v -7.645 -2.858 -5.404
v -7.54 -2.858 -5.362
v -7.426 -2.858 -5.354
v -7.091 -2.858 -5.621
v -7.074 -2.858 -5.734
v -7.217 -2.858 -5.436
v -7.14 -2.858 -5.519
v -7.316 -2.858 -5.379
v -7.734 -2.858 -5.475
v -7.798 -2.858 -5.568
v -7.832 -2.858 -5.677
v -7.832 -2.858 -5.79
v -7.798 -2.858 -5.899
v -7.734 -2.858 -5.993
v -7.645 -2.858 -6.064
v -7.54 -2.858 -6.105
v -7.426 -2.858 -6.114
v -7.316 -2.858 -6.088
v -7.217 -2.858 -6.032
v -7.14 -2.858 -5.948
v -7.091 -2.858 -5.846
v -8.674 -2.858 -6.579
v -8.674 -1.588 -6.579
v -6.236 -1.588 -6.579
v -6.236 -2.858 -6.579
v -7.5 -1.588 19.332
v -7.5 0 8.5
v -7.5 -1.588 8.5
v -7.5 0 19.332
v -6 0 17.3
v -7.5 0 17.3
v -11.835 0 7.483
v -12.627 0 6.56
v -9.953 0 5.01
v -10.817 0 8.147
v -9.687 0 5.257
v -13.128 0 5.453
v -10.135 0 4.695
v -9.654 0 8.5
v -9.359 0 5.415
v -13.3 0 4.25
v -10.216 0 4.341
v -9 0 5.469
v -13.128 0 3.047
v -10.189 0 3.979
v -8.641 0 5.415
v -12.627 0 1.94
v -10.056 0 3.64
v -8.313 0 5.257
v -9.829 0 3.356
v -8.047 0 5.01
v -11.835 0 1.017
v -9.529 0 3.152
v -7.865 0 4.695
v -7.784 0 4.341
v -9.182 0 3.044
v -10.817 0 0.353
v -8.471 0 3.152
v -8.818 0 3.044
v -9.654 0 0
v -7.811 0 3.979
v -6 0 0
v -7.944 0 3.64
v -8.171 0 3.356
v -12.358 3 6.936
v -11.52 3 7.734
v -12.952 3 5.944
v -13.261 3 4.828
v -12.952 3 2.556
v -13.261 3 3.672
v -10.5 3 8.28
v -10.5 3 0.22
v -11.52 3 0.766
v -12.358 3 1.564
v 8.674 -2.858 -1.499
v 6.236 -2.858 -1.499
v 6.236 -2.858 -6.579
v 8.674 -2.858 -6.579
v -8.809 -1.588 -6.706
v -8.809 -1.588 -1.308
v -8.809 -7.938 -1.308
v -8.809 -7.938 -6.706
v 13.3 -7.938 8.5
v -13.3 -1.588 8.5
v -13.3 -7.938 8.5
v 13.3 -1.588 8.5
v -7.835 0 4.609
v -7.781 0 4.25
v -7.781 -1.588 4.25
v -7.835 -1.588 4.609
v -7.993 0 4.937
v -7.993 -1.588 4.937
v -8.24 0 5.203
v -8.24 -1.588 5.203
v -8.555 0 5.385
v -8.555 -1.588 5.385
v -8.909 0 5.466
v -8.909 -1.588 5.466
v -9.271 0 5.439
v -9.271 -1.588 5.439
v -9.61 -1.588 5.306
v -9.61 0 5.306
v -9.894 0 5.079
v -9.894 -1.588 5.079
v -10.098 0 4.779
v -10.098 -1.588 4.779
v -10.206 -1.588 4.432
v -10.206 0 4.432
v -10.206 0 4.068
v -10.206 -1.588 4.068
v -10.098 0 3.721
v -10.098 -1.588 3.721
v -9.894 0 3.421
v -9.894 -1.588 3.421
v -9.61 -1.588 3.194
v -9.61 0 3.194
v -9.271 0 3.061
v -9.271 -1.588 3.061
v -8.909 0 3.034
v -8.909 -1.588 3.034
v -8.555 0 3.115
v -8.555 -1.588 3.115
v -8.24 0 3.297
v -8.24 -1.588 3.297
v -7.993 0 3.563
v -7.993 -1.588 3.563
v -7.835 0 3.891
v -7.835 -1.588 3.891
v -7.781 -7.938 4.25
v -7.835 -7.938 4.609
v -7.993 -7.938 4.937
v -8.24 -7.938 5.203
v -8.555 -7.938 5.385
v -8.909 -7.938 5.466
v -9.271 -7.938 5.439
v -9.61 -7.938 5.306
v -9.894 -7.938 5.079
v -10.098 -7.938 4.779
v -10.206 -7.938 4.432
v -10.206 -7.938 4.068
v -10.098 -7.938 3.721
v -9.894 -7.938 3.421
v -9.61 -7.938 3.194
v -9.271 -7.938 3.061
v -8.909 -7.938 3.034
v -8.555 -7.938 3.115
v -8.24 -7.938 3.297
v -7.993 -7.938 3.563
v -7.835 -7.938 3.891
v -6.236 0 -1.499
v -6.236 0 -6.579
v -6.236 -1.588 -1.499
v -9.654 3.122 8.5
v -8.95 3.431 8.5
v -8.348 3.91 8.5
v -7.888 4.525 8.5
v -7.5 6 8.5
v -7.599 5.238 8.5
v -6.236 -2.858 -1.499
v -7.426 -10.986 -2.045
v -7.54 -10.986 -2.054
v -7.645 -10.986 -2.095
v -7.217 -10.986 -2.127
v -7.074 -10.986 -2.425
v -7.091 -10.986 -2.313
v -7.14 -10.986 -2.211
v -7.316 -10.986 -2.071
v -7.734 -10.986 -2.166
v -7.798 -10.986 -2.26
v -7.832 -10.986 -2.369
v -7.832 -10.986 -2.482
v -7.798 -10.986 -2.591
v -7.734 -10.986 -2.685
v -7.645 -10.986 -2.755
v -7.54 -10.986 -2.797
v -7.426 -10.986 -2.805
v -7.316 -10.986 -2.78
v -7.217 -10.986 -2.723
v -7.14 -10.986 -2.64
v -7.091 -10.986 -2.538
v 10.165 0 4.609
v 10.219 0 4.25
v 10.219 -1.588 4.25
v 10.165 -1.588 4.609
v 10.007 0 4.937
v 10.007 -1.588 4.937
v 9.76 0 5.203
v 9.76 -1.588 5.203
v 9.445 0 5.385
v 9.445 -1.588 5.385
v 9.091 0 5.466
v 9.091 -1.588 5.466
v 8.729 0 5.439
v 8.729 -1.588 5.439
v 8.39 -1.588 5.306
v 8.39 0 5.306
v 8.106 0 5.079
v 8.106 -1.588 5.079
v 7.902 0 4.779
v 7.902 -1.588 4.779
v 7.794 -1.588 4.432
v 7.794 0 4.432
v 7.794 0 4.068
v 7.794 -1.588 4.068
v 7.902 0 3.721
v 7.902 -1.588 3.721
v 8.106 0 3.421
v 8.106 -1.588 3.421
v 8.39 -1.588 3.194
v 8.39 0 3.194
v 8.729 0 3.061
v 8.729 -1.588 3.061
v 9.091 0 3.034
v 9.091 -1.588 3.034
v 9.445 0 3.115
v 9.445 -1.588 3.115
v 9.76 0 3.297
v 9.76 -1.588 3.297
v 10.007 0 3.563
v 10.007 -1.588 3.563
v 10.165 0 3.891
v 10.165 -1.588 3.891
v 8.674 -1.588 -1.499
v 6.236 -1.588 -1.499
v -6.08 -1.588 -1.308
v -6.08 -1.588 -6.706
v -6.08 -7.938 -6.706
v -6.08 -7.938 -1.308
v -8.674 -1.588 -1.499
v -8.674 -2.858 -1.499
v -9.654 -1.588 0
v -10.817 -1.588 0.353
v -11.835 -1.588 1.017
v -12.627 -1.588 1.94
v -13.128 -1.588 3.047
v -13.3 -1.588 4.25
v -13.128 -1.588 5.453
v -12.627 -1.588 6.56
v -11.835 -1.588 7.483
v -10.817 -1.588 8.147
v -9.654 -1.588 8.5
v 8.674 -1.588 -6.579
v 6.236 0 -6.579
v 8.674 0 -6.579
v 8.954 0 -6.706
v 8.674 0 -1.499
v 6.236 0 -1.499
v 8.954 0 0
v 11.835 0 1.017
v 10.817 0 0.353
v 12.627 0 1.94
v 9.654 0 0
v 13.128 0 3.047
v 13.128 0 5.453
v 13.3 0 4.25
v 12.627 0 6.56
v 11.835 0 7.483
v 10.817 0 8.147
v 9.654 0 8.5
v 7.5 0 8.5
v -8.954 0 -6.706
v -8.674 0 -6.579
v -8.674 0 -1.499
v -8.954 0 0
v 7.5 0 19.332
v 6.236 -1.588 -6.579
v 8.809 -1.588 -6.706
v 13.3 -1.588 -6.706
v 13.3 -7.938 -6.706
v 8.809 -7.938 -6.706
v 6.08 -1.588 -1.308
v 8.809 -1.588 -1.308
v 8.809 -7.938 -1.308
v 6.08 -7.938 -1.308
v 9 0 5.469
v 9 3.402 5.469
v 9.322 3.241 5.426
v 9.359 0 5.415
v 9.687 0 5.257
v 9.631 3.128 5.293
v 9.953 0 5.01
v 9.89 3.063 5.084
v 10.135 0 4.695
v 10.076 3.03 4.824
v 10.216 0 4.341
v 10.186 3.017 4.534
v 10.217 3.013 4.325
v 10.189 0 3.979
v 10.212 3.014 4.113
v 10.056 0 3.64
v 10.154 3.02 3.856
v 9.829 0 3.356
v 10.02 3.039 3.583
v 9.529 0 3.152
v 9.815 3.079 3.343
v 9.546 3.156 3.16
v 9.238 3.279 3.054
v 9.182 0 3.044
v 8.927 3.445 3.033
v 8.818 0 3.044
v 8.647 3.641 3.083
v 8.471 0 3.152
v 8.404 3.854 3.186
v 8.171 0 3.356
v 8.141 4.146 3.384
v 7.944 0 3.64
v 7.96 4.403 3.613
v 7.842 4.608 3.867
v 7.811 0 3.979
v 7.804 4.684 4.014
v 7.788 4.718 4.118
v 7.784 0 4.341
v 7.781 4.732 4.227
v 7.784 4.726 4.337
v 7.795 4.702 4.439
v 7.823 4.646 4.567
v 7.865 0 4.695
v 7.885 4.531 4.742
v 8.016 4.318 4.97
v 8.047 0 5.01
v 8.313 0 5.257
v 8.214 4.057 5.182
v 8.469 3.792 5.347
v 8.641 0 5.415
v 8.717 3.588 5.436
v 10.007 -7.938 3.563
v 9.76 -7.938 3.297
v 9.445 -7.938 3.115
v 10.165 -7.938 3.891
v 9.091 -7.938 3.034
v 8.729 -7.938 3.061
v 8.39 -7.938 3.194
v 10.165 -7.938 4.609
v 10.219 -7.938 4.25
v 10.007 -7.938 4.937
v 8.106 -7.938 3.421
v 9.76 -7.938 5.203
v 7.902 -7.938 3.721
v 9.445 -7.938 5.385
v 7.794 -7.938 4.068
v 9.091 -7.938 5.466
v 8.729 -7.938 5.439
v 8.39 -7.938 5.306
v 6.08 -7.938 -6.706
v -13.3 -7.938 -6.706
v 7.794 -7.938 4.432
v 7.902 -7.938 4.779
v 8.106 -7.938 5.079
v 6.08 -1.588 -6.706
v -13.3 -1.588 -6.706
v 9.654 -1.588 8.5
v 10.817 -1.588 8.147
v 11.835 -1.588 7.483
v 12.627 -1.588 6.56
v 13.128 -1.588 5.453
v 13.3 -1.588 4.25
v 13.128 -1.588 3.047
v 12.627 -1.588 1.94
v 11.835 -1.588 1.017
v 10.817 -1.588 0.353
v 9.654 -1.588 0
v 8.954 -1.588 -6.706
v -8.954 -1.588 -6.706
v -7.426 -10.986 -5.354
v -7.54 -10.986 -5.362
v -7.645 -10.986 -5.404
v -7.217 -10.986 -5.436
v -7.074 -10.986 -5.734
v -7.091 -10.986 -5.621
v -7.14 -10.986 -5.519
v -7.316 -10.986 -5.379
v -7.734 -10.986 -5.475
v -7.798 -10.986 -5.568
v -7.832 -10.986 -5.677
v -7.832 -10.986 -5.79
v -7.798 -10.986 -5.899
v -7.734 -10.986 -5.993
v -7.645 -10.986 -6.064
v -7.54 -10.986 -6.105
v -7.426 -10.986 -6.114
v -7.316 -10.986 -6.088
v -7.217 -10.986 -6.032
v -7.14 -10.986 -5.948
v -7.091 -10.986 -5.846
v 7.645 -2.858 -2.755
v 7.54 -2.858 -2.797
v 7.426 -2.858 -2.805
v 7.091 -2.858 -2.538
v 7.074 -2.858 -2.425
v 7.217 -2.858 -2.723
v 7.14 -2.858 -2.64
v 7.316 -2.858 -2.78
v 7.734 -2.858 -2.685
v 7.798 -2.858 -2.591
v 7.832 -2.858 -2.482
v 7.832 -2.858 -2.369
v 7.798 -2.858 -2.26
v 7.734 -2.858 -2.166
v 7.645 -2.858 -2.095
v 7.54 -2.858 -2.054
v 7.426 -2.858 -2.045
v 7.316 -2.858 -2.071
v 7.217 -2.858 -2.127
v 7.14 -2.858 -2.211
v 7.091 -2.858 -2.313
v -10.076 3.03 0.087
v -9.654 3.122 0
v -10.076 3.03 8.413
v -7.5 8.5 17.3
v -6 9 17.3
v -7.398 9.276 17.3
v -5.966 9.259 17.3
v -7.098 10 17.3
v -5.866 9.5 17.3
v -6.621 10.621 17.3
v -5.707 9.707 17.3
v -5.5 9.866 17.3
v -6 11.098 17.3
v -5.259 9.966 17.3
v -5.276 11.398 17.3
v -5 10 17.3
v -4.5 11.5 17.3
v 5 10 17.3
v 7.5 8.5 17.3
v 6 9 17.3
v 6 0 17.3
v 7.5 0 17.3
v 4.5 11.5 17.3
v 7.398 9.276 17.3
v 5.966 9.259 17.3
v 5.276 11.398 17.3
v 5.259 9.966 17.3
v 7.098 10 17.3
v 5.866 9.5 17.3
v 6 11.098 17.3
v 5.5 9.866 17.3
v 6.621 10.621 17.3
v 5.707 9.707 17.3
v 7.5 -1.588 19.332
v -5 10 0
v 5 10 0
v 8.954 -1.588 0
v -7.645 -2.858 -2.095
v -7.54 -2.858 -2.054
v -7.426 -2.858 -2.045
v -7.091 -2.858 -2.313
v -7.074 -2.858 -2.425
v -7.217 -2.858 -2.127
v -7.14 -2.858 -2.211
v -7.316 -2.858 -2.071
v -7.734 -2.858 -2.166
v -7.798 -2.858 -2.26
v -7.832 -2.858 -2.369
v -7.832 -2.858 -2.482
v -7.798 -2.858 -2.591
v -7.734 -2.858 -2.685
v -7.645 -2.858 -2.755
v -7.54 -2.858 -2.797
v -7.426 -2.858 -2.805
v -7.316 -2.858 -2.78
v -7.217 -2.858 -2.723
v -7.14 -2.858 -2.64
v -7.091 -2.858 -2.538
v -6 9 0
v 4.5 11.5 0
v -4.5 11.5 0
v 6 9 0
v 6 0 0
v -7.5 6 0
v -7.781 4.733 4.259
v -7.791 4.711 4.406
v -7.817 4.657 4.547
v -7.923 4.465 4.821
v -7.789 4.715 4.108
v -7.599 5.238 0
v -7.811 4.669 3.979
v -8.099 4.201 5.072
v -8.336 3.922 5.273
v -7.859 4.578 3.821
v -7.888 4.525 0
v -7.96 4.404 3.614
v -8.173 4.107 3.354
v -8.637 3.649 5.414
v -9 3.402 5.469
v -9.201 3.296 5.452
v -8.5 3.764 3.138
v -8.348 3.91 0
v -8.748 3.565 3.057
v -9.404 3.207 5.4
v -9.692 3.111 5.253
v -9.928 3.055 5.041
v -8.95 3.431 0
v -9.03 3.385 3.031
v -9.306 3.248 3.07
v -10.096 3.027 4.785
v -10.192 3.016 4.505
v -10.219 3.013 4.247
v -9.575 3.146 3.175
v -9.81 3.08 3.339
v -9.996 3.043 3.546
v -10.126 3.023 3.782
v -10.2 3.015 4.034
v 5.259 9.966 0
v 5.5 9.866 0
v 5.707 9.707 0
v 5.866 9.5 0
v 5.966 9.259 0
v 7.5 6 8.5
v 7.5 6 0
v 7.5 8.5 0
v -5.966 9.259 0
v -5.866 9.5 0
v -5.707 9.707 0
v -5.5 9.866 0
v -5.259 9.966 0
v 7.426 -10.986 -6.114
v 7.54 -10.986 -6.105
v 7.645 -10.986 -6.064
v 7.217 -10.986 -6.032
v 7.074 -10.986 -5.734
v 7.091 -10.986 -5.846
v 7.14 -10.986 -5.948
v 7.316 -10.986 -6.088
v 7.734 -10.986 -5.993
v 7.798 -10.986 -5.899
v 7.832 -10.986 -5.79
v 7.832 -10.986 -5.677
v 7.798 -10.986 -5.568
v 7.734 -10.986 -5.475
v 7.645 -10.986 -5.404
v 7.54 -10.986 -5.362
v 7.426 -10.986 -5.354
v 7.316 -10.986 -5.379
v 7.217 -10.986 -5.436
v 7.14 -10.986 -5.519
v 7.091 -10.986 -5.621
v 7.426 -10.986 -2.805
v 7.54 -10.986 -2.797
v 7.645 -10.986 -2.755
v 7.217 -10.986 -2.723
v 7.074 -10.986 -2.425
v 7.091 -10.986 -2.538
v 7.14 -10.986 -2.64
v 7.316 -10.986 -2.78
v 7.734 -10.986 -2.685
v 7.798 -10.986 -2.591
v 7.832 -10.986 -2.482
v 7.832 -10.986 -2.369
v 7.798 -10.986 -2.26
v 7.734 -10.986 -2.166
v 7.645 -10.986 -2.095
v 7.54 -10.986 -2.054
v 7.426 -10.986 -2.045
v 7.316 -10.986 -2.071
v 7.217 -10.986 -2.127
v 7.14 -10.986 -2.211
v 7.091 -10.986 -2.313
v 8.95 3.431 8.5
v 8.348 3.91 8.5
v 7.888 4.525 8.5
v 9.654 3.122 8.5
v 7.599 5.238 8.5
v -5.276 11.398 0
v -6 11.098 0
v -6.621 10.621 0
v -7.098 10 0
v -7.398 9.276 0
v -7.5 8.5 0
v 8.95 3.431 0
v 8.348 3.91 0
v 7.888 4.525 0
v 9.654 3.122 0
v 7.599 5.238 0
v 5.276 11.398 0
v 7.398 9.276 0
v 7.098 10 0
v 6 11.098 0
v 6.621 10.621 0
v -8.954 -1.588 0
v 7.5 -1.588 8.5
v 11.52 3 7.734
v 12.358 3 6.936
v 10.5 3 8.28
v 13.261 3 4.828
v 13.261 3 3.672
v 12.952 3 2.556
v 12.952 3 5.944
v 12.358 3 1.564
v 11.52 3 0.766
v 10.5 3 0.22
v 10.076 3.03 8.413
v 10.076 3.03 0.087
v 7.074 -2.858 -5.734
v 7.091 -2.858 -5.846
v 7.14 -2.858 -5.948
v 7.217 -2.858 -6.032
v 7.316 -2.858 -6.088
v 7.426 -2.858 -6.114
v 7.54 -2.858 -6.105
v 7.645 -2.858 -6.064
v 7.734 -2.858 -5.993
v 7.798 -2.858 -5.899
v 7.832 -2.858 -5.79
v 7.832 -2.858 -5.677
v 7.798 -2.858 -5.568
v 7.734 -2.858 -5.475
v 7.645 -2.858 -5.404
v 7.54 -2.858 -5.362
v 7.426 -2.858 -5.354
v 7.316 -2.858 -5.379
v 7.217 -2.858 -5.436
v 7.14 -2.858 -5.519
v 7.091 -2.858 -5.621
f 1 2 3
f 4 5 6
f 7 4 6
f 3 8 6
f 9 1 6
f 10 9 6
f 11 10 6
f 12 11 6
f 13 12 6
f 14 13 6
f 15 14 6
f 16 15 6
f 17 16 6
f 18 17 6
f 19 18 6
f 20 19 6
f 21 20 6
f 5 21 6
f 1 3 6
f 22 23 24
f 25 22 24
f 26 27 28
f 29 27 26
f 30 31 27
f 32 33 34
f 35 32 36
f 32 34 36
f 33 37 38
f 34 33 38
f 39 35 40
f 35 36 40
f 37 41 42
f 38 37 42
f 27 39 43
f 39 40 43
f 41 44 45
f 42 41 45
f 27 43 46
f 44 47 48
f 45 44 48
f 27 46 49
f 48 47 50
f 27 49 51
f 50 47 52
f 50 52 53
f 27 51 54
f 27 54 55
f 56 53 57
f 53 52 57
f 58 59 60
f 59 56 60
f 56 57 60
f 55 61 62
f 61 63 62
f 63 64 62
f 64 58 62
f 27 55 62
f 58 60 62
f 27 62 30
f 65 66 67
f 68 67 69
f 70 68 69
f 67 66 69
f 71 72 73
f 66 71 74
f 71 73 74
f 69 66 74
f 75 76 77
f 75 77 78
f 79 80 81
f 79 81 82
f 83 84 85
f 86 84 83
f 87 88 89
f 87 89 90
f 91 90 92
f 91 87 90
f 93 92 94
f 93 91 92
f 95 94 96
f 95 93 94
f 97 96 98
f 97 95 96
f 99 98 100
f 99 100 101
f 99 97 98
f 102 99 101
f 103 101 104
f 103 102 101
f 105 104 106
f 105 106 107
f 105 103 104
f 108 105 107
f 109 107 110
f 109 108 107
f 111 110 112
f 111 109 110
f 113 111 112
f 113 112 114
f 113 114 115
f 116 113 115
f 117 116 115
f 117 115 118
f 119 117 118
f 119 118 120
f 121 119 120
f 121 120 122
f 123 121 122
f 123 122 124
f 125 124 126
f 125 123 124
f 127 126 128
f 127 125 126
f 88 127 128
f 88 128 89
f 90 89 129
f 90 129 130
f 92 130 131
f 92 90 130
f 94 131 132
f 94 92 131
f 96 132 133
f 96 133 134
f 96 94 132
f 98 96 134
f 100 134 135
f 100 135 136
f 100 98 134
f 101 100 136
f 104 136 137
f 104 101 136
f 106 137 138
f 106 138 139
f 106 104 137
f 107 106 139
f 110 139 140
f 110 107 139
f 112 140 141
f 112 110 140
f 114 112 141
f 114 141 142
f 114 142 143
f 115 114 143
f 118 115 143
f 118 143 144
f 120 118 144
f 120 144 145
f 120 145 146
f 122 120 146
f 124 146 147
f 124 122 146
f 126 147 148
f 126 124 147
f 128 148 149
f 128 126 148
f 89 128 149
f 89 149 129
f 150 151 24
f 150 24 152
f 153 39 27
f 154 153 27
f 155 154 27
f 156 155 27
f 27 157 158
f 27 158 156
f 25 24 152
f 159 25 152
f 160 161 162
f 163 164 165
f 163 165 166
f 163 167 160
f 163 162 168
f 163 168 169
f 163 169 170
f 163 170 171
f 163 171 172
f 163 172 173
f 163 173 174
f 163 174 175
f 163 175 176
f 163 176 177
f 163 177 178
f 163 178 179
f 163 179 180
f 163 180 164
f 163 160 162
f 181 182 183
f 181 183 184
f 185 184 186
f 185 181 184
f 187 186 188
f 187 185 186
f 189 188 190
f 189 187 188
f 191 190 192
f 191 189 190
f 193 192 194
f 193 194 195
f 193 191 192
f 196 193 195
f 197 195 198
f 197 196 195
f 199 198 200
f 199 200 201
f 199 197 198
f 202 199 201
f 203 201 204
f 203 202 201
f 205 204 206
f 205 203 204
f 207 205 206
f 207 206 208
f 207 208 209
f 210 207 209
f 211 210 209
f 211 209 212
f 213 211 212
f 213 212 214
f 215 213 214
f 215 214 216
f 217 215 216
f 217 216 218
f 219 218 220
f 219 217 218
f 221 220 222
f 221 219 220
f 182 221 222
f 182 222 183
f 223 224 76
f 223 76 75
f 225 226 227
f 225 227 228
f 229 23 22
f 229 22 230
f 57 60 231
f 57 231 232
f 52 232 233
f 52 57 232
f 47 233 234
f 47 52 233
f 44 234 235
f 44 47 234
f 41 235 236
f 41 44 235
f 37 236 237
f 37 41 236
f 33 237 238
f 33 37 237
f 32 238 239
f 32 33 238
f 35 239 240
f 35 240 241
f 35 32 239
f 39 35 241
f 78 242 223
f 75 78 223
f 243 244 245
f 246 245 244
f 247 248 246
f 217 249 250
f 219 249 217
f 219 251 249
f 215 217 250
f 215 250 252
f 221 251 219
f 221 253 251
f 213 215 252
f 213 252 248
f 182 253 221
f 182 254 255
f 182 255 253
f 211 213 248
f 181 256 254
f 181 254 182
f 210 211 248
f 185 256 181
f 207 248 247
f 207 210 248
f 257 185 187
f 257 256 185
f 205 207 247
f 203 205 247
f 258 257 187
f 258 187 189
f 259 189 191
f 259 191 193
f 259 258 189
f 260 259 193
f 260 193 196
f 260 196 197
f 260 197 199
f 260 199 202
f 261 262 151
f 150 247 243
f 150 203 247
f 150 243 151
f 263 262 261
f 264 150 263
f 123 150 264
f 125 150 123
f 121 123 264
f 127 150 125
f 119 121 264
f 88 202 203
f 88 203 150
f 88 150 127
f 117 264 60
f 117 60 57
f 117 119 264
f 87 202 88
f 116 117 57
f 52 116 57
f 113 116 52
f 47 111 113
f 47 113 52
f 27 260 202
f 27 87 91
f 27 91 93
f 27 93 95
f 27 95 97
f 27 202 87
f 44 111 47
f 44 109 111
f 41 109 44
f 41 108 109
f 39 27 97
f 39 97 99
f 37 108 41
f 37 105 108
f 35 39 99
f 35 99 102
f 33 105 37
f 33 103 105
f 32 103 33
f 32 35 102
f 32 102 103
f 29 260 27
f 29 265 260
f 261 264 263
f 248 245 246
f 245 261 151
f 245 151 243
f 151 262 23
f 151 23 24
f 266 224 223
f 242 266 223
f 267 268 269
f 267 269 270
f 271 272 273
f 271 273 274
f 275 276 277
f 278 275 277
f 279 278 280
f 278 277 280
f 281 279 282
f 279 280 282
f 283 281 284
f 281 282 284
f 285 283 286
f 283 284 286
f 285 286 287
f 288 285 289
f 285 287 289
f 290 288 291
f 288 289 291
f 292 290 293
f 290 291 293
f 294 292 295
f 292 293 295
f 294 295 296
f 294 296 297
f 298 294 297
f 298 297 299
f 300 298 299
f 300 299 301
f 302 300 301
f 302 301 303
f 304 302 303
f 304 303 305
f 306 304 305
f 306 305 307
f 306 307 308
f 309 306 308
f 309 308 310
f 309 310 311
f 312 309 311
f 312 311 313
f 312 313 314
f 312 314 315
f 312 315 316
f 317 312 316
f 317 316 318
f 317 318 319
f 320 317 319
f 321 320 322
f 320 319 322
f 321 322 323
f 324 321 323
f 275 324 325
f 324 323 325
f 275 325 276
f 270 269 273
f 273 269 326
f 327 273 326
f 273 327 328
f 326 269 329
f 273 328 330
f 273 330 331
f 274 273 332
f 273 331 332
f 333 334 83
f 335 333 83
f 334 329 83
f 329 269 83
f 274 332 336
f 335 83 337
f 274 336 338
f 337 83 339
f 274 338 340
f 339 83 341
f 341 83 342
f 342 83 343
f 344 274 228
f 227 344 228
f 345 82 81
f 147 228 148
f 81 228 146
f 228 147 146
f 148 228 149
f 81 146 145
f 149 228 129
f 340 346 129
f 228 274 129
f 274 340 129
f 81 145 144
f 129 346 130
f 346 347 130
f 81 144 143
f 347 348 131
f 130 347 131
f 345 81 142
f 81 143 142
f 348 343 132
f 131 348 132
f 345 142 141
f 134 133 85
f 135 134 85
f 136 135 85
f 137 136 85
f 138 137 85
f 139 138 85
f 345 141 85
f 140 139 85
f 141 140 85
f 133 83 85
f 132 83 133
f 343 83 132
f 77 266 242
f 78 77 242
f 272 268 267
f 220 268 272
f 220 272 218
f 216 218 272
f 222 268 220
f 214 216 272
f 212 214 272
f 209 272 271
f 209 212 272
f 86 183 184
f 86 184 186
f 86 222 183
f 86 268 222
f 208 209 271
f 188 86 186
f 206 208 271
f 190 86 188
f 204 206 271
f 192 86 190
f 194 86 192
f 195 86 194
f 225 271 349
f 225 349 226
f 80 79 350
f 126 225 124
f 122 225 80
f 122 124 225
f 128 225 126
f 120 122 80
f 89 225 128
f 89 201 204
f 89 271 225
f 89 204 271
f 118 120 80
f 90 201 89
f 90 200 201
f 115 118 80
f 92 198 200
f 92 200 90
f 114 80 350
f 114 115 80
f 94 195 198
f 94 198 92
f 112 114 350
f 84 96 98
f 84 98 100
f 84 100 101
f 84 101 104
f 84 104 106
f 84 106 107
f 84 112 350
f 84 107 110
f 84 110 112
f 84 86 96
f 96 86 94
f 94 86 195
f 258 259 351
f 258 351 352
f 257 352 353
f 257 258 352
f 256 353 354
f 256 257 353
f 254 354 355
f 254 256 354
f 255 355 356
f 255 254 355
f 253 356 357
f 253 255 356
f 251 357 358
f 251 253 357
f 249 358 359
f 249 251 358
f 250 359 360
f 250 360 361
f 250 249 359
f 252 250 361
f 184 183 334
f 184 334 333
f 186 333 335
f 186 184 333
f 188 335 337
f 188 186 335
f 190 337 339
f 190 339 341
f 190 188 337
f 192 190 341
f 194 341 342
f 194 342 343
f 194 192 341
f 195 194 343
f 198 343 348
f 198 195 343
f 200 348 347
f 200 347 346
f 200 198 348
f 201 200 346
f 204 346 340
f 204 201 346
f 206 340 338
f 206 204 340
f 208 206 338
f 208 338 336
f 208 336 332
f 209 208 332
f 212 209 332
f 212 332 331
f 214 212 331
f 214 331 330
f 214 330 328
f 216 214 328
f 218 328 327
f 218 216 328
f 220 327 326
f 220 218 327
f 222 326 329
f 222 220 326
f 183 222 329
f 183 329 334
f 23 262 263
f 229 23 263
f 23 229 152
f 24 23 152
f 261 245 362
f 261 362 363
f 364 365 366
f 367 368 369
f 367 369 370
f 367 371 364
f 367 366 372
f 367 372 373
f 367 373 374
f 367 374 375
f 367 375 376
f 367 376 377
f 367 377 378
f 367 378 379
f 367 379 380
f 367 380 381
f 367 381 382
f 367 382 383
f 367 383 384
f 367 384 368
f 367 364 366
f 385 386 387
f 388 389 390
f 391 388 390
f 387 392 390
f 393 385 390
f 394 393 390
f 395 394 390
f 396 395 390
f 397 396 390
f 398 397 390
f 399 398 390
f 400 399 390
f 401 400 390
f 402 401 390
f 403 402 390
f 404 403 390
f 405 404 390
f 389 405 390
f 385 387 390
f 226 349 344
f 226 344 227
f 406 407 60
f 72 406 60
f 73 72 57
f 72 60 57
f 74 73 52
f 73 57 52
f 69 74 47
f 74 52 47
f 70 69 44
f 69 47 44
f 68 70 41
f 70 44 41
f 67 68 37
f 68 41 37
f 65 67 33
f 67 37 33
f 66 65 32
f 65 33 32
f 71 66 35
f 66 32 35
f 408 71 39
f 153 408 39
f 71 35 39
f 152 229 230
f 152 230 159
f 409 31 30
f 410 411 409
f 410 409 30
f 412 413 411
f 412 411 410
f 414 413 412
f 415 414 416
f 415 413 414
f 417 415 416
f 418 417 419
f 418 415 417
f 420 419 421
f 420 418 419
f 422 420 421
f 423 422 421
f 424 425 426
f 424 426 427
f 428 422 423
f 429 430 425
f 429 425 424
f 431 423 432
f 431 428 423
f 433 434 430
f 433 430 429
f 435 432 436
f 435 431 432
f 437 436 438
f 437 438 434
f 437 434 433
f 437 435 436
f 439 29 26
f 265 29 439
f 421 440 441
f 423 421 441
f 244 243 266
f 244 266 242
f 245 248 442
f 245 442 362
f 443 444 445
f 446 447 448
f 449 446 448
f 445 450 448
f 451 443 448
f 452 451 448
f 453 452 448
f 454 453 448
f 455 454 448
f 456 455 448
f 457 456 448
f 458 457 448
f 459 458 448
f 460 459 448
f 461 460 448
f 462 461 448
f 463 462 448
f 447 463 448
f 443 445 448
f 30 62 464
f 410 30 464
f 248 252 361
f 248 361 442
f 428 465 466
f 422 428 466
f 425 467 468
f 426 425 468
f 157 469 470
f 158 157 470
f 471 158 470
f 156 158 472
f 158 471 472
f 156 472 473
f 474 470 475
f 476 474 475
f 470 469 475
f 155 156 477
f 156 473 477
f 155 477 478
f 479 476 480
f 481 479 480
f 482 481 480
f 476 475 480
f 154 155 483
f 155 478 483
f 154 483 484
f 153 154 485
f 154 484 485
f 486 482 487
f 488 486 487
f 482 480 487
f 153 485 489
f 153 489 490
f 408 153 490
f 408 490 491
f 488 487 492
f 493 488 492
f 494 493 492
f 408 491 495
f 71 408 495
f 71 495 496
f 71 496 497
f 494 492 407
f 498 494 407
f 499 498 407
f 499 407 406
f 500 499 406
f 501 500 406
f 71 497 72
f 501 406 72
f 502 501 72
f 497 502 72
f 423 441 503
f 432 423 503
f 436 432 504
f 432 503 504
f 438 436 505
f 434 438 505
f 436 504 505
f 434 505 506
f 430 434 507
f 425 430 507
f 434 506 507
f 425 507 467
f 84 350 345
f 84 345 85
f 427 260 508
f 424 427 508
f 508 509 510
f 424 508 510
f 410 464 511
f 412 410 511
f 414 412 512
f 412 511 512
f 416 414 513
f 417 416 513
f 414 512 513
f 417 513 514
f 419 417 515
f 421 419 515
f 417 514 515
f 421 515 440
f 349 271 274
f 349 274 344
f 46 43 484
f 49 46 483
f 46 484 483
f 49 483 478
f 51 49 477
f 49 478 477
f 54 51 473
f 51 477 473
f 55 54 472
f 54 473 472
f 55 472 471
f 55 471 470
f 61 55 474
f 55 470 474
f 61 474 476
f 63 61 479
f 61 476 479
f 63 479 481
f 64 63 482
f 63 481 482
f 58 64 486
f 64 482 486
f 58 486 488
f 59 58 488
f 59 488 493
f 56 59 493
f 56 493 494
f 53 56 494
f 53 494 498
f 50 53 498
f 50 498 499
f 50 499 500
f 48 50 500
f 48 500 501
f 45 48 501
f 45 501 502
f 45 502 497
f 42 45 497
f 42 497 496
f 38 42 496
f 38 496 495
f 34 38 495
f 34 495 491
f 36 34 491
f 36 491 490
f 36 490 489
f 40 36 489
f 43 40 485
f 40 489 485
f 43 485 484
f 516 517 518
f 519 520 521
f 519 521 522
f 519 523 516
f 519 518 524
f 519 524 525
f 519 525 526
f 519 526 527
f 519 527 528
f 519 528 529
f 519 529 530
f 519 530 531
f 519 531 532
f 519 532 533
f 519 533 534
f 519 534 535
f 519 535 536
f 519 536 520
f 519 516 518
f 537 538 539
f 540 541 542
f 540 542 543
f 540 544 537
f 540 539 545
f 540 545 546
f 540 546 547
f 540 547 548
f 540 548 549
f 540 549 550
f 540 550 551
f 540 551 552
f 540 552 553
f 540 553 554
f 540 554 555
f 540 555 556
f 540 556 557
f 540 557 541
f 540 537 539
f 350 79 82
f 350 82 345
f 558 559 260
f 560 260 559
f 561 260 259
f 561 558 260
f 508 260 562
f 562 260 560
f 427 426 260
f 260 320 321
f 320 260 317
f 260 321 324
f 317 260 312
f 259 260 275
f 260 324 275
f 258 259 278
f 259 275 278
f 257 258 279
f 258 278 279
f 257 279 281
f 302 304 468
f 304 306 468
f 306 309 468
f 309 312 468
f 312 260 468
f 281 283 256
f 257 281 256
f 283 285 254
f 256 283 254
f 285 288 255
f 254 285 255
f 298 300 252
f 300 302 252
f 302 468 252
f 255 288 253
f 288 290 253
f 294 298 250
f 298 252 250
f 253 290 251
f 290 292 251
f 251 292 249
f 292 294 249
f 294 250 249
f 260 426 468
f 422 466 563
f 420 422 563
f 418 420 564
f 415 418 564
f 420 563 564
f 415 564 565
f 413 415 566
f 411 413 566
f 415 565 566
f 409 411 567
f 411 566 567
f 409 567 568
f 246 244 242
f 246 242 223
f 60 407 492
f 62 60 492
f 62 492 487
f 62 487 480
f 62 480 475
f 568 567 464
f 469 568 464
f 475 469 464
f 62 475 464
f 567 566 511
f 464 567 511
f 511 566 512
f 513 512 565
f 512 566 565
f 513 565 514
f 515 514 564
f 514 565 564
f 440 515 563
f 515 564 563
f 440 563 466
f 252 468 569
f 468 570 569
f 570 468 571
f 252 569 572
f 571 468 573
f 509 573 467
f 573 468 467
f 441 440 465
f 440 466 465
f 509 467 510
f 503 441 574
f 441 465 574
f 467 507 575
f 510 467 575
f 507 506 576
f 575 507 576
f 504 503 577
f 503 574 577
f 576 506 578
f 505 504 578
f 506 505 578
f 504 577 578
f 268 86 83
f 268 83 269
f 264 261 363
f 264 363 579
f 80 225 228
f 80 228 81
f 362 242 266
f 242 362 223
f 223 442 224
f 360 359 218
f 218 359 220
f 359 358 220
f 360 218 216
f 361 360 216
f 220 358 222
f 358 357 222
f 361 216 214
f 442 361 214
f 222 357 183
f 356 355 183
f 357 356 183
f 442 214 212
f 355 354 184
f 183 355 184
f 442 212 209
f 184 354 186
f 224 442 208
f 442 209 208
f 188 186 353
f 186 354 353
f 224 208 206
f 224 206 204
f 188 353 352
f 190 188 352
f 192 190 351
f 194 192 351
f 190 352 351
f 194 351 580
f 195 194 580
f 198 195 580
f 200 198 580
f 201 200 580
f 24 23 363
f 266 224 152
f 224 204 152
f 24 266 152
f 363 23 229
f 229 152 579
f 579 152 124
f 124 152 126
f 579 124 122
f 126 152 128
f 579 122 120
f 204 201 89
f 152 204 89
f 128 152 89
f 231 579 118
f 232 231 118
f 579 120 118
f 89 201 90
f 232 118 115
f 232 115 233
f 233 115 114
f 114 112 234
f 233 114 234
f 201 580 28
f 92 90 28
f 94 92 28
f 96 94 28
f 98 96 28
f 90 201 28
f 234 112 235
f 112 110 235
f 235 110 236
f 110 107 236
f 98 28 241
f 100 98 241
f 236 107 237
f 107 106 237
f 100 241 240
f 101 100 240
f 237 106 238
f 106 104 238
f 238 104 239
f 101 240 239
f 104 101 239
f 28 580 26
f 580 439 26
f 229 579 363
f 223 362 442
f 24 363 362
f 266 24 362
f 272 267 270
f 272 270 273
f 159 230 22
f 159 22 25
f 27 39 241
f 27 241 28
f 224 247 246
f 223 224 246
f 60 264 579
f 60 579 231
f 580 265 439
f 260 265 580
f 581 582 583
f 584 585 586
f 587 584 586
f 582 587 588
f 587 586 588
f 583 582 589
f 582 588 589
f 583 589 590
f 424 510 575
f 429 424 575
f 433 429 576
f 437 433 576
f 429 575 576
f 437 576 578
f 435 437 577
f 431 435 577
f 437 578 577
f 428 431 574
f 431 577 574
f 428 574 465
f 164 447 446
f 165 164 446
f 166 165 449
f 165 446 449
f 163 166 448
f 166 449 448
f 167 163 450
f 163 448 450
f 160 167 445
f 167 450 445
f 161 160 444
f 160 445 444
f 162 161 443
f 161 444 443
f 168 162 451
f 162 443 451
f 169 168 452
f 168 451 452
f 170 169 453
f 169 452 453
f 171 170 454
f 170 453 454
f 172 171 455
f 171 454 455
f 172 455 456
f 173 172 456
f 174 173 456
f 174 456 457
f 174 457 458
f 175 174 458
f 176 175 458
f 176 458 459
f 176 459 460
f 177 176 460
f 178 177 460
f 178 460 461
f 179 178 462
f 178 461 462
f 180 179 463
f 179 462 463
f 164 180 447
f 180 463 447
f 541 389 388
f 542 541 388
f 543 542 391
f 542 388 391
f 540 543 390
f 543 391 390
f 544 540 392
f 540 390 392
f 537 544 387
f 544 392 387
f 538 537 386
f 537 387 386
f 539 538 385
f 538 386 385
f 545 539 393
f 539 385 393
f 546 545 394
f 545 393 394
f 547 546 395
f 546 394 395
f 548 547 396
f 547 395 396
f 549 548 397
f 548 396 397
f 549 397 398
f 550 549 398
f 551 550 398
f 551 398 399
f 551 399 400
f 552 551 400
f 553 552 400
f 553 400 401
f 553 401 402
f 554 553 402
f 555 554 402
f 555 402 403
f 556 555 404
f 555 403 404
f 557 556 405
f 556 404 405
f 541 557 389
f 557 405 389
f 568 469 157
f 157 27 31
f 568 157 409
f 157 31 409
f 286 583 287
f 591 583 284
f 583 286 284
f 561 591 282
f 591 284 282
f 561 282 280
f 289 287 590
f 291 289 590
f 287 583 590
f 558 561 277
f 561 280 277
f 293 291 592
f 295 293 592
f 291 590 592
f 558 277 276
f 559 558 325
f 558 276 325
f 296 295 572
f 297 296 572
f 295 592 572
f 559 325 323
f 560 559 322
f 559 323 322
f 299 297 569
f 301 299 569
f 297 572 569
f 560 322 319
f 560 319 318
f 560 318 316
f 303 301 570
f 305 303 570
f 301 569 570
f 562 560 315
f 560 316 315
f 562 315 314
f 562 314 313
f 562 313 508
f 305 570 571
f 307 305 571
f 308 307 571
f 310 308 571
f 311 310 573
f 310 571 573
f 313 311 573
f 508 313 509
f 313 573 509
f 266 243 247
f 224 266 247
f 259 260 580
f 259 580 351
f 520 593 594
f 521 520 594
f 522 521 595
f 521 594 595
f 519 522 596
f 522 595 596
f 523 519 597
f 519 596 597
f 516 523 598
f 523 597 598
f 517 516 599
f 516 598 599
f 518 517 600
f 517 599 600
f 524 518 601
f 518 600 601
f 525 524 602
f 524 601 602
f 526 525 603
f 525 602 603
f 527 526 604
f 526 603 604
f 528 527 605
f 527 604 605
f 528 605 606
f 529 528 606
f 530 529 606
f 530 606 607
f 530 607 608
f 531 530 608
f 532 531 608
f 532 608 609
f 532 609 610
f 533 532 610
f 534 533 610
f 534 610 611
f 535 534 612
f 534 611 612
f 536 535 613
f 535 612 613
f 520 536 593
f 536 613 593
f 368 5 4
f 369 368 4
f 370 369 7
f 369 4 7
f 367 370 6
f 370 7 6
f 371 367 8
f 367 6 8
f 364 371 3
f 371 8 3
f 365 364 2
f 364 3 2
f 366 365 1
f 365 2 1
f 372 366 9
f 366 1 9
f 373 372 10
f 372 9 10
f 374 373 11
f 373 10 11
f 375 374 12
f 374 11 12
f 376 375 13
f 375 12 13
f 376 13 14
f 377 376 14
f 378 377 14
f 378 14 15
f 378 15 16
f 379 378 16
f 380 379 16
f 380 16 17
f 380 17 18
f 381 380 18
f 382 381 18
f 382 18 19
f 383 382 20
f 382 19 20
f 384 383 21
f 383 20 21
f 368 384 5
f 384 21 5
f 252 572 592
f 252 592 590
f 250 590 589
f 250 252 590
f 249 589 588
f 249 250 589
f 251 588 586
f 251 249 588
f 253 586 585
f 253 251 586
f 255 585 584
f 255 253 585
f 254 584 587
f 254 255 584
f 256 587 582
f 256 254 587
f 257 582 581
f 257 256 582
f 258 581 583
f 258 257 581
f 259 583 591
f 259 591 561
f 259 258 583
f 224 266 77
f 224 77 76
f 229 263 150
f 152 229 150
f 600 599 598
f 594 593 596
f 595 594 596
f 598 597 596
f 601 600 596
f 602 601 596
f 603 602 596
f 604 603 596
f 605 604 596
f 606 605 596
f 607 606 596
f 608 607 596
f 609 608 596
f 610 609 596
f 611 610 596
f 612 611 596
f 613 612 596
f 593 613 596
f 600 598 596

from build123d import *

# Parameters (mm, degrees)
EXTRUDE1_DEPTH            = 17.3
SKETCH2_W                 = 5.8
SKETCH2_H                 = 8.5
EXTRUDE2_DEPTH            = 8.8
SKETCH3_R                 = 1
EXTRUDE3_DEPTH            = 5
F_2_CLEARANCE_HOLE1_D     = 2.4384
F_2_CLEARANCE_HOLE1_DEPTH = 11.5
SKETCH5_R                 = 1.2192
SKETCH5_W                 = 2.4384
SKETCH5_H                 = 5.08
EXTRUDE4_DEPTH            = 1.5875
SKETCH6_W                 = 2.4384
SKETCH6_H                 = 5.08
EXTRUDE5_DEPTH            = 1.27
EXTRUDE5_2_DEPTH          = 1.27
SKETCH7_R                 = 0.381
EXTRUDE6_DEPTH            = 8.128
EXTRUDE6_2_DEPTH          = 8.128
EXTRUDE6_3_DEPTH          = 8.128
EXTRUDE6_4_DEPTH          = 8.128
SKETCH8_R                 = 1.2192
EXTRUDE7_DEPTH            = 6.35


with BuildPart() as part:
    # Sketch1 → Extrude1 (new body)
    with BuildSketch(Plane.XY):
        with BuildLine():
            Line((-13.3, 0), (-6, 0))
            Line((-6, 0), (-6, 9))
            ThreePointArc((-6, 9), (-5.707106781, 9.707106781), (-5, 10))
            Line((-5, 10), (5, 10))
            ThreePointArc((5, 10), (5.707106781, 9.707106781), (6, 9))
            Line((6, 9), (6, 0))
            Line((6, 0), (13.3, 0))
            Line((13.3, 0), (13.3, 3))
            Line((13.3, 3), (10.5, 3))
            ThreePointArc((10.5, 3), (8.378679656, 3.878679656), (7.5, 6))
            Line((7.5, 6), (7.5, 8.5))
            ThreePointArc((7.5, 8.5), (6.621320344, 10.621320344), (4.5, 11.5))
            Line((4.5, 11.5), (-4.5, 11.5))
            ThreePointArc((-4.5, 11.5), (-6.621320344, 10.621320344), (-7.5, 8.5))
            Line((-7.5, 8.5), (-7.5, 6))
            ThreePointArc((-7.5, 6), (-8.378679656, 3.878679656), (-10.5, 3))
            Line((-10.5, 3), (-13.3, 3))
            Line((-13.3, 3), (-13.3, 0))
        make_face()
    extrude(amount=EXTRUDE1_DEPTH)

    # Sketch2 → Extrude2 (cut)
    with BuildSketch(Plane.XY.offset(17.3)):
        with Locations((-10.4, 4.25)):
            Rectangle(SKETCH2_W, SKETCH2_H)
        with Locations((10.4, 4.25)):
            Rectangle(SKETCH2_W, SKETCH2_H)
    extrude(amount=-EXTRUDE2_DEPTH, mode=Mode.SUBTRACT)

    # Sketch3 → Extrude3 (cut)
    with BuildSketch(Plane.XZ):
        with Locations(Location((-9, 4.25, 0), (0, 0, 270))):  # turned: the seam where the file's is
            Circle(SKETCH3_R)
        with Locations(Location((9, 4.25, 0), (0, 0, 270))):  # turned: the seam where the file's is
            Circle(SKETCH3_R)
        with BuildLine():
            Line((9.653834842, 8.5), (9.653834842, 9.262963398))
            Line((9.653834842, 9.262963398), (15.079268599, 9.262963398))
            Line((15.079268599, 9.262963398), (15.079268599, -0.486230121))
            Line((15.079268599, -0.486230121), (9.653834842, -0.486230121))
            Line((9.653834842, -0.486230121), (9.653834842, 0))
            ThreePointArc((9.653834842, 0), (13.3, 4.25), (9.653834842, 8.5))
        make_face()
        with BuildLine():
            Line((-9.653834842, -0.486230121), (-9.653834842, 0))
            ThreePointArc((-9.653834842, 0), (-13.3, 4.25), (-9.653834842, 8.5))
            Line((-9.653834842, 8.5), (-9.653834842, 9.262963398))
            Line((-9.653834842, 9.262963398), (-15.079268599, 9.262963398))
            Line((-15.079268599, 9.262963398), (-15.079268599, -0.486230121))
            Line((-15.079268599, -0.486230121), (-9.653834842, -0.486230121))
        make_face()
    extrude(amount=-EXTRUDE3_DEPTH, mode=Mode.SUBTRACT)

    # #2 Clearance Hole1
    with Locations(Plane(origin=(-9, 0, 4.25), x_dir=(0, 0, -1), z_dir=(0, -1, 0))):
        with Locations((0, 0), (0, 18)):
            Hole(F_2_CLEARANCE_HOLE1_D / 2, depth=F_2_CLEARANCE_HOLE1_DEPTH)


with BuildPart() as body_2:
    # Sketch5 → Extrude4 (new body)
    with BuildSketch(Plane.XZ):
        with BuildLine():
            Line((-8.9535, -6.7056), (-8.9535, 0))
            Line((-8.9535, 0), (-9.653834842, 0))
            ThreePointArc((-9.653834842, 0), (-13.3, 4.25), (-9.653834842, 8.5))
            Line((-9.653834842, 8.5), (-7.5, 8.5))
            Line((-7.5, 8.5), (-7.5, 19.332))
            Line((-7.5, 19.332), (7.5, 19.332))
            Line((7.5, 19.332), (7.5, 8.5))
            Line((7.5, 8.5), (9.653834842, 8.5))
            ThreePointArc((9.653834842, 8.5), (13.3, 4.25), (9.653834842, 0))
            Line((9.653834842, 0), (8.9535, 0))
            Line((8.9535, 0), (8.9535, -6.7056))
            Line((8.9535, -6.7056), (-8.9535, -6.7056))
        make_face()
        with Locations((9, 4.25)):
            Circle(SKETCH5_R, mode=Mode.SUBTRACT)
        with Locations((-9, 4.25)):
            Circle(SKETCH5_R, mode=Mode.SUBTRACT)
        with Locations((-7.4549, -4.0386)):
            Rectangle(SKETCH5_W, SKETCH5_H, mode=Mode.SUBTRACT)
        with Locations((7.4549, -4.0386)):
            Rectangle(SKETCH5_W, SKETCH5_H, mode=Mode.SUBTRACT)
    extrude(amount=EXTRUDE4_DEPTH)


with BuildPart() as body_3:
    # Sketch6 → Extrude5 (new body)
    with BuildSketch(Plane.XZ.offset(1.5875)):
        with Locations((7.4549, -4.0386)):
            Rectangle(SKETCH6_W, SKETCH6_H)
    extrude(amount=EXTRUDE5_DEPTH)


with BuildPart() as body_4:
    # Sketch6 → Extrude5 2 (new body)
    with BuildSketch(Plane.XZ.offset(1.5875)):
        with Locations((-7.4549, -4.0386)):
            Rectangle(SKETCH6_W, SKETCH6_H)
    extrude(amount=EXTRUDE5_2_DEPTH)


with BuildPart() as body_5:
    # Sketch7 → Extrude6 (new body)
    with BuildSketch(Plane.XZ.offset(2.8575)):
        with Locations((-7.4549, -2.425360111)):
            Circle(SKETCH7_R)
    extrude(amount=EXTRUDE6_DEPTH)


with BuildPart() as body_6:
    # Sketch7 → Extrude6 2 (new body)
    with BuildSketch(Plane.XZ.offset(2.8575)):
        with Locations((-7.4549, -5.733691209)):
            Circle(SKETCH7_R)
    extrude(amount=EXTRUDE6_2_DEPTH)


with BuildPart() as body_7:
    # Sketch7 → Extrude6 3 (new body)
    with BuildSketch(Plane.XZ.offset(2.8575)):
        with Locations(Location((7.4549, -5.733691209, 0), (0, 0, 180))):  # turned: the seam where the file's is
            Circle(SKETCH7_R)
    extrude(amount=EXTRUDE6_3_DEPTH)


with BuildPart() as body_8:
    # Sketch7 → Extrude6 4 (new body)
    with BuildSketch(Plane.XZ.offset(2.8575)):
        with Locations(Location((7.4549, -2.425360111, 0), (0, 0, 180))):  # turned: the seam where the file's is
            Circle(SKETCH7_R)
    extrude(amount=EXTRUDE6_4_DEPTH)


with BuildPart() as body_9:
    # Sketch8 → Extrude7 (new body)
    with BuildSketch(Plane.XZ.offset(1.5875)):
        Polygon((-13.3, 8.5), (13.3, 8.5), (13.3, -6.7056), (8.808846723, -6.7056), (8.808846723, -1.308184758), (6.080310838, -1.308184758), (6.080310838, -6.7056), (-6.080310838, -6.7056), (-6.080310838, -1.308184758), (-8.808846723, -1.308184758), (-8.808846723, -6.7056), (-13.3, -6.7056), align=None)
        with Locations((-9, 4.25)):
            Circle(SKETCH8_R, mode=Mode.SUBTRACT)
        with Locations((9, 4.25)):
            Circle(SKETCH8_R, mode=Mode.SUBTRACT)
    extrude(amount=EXTRUDE7_DEPTH)


solid = Compound([part.part, body_2.part, body_3.part, body_4.part, body_5.part, body_6.part, body_7.part, body_8.part, body_9.part])
